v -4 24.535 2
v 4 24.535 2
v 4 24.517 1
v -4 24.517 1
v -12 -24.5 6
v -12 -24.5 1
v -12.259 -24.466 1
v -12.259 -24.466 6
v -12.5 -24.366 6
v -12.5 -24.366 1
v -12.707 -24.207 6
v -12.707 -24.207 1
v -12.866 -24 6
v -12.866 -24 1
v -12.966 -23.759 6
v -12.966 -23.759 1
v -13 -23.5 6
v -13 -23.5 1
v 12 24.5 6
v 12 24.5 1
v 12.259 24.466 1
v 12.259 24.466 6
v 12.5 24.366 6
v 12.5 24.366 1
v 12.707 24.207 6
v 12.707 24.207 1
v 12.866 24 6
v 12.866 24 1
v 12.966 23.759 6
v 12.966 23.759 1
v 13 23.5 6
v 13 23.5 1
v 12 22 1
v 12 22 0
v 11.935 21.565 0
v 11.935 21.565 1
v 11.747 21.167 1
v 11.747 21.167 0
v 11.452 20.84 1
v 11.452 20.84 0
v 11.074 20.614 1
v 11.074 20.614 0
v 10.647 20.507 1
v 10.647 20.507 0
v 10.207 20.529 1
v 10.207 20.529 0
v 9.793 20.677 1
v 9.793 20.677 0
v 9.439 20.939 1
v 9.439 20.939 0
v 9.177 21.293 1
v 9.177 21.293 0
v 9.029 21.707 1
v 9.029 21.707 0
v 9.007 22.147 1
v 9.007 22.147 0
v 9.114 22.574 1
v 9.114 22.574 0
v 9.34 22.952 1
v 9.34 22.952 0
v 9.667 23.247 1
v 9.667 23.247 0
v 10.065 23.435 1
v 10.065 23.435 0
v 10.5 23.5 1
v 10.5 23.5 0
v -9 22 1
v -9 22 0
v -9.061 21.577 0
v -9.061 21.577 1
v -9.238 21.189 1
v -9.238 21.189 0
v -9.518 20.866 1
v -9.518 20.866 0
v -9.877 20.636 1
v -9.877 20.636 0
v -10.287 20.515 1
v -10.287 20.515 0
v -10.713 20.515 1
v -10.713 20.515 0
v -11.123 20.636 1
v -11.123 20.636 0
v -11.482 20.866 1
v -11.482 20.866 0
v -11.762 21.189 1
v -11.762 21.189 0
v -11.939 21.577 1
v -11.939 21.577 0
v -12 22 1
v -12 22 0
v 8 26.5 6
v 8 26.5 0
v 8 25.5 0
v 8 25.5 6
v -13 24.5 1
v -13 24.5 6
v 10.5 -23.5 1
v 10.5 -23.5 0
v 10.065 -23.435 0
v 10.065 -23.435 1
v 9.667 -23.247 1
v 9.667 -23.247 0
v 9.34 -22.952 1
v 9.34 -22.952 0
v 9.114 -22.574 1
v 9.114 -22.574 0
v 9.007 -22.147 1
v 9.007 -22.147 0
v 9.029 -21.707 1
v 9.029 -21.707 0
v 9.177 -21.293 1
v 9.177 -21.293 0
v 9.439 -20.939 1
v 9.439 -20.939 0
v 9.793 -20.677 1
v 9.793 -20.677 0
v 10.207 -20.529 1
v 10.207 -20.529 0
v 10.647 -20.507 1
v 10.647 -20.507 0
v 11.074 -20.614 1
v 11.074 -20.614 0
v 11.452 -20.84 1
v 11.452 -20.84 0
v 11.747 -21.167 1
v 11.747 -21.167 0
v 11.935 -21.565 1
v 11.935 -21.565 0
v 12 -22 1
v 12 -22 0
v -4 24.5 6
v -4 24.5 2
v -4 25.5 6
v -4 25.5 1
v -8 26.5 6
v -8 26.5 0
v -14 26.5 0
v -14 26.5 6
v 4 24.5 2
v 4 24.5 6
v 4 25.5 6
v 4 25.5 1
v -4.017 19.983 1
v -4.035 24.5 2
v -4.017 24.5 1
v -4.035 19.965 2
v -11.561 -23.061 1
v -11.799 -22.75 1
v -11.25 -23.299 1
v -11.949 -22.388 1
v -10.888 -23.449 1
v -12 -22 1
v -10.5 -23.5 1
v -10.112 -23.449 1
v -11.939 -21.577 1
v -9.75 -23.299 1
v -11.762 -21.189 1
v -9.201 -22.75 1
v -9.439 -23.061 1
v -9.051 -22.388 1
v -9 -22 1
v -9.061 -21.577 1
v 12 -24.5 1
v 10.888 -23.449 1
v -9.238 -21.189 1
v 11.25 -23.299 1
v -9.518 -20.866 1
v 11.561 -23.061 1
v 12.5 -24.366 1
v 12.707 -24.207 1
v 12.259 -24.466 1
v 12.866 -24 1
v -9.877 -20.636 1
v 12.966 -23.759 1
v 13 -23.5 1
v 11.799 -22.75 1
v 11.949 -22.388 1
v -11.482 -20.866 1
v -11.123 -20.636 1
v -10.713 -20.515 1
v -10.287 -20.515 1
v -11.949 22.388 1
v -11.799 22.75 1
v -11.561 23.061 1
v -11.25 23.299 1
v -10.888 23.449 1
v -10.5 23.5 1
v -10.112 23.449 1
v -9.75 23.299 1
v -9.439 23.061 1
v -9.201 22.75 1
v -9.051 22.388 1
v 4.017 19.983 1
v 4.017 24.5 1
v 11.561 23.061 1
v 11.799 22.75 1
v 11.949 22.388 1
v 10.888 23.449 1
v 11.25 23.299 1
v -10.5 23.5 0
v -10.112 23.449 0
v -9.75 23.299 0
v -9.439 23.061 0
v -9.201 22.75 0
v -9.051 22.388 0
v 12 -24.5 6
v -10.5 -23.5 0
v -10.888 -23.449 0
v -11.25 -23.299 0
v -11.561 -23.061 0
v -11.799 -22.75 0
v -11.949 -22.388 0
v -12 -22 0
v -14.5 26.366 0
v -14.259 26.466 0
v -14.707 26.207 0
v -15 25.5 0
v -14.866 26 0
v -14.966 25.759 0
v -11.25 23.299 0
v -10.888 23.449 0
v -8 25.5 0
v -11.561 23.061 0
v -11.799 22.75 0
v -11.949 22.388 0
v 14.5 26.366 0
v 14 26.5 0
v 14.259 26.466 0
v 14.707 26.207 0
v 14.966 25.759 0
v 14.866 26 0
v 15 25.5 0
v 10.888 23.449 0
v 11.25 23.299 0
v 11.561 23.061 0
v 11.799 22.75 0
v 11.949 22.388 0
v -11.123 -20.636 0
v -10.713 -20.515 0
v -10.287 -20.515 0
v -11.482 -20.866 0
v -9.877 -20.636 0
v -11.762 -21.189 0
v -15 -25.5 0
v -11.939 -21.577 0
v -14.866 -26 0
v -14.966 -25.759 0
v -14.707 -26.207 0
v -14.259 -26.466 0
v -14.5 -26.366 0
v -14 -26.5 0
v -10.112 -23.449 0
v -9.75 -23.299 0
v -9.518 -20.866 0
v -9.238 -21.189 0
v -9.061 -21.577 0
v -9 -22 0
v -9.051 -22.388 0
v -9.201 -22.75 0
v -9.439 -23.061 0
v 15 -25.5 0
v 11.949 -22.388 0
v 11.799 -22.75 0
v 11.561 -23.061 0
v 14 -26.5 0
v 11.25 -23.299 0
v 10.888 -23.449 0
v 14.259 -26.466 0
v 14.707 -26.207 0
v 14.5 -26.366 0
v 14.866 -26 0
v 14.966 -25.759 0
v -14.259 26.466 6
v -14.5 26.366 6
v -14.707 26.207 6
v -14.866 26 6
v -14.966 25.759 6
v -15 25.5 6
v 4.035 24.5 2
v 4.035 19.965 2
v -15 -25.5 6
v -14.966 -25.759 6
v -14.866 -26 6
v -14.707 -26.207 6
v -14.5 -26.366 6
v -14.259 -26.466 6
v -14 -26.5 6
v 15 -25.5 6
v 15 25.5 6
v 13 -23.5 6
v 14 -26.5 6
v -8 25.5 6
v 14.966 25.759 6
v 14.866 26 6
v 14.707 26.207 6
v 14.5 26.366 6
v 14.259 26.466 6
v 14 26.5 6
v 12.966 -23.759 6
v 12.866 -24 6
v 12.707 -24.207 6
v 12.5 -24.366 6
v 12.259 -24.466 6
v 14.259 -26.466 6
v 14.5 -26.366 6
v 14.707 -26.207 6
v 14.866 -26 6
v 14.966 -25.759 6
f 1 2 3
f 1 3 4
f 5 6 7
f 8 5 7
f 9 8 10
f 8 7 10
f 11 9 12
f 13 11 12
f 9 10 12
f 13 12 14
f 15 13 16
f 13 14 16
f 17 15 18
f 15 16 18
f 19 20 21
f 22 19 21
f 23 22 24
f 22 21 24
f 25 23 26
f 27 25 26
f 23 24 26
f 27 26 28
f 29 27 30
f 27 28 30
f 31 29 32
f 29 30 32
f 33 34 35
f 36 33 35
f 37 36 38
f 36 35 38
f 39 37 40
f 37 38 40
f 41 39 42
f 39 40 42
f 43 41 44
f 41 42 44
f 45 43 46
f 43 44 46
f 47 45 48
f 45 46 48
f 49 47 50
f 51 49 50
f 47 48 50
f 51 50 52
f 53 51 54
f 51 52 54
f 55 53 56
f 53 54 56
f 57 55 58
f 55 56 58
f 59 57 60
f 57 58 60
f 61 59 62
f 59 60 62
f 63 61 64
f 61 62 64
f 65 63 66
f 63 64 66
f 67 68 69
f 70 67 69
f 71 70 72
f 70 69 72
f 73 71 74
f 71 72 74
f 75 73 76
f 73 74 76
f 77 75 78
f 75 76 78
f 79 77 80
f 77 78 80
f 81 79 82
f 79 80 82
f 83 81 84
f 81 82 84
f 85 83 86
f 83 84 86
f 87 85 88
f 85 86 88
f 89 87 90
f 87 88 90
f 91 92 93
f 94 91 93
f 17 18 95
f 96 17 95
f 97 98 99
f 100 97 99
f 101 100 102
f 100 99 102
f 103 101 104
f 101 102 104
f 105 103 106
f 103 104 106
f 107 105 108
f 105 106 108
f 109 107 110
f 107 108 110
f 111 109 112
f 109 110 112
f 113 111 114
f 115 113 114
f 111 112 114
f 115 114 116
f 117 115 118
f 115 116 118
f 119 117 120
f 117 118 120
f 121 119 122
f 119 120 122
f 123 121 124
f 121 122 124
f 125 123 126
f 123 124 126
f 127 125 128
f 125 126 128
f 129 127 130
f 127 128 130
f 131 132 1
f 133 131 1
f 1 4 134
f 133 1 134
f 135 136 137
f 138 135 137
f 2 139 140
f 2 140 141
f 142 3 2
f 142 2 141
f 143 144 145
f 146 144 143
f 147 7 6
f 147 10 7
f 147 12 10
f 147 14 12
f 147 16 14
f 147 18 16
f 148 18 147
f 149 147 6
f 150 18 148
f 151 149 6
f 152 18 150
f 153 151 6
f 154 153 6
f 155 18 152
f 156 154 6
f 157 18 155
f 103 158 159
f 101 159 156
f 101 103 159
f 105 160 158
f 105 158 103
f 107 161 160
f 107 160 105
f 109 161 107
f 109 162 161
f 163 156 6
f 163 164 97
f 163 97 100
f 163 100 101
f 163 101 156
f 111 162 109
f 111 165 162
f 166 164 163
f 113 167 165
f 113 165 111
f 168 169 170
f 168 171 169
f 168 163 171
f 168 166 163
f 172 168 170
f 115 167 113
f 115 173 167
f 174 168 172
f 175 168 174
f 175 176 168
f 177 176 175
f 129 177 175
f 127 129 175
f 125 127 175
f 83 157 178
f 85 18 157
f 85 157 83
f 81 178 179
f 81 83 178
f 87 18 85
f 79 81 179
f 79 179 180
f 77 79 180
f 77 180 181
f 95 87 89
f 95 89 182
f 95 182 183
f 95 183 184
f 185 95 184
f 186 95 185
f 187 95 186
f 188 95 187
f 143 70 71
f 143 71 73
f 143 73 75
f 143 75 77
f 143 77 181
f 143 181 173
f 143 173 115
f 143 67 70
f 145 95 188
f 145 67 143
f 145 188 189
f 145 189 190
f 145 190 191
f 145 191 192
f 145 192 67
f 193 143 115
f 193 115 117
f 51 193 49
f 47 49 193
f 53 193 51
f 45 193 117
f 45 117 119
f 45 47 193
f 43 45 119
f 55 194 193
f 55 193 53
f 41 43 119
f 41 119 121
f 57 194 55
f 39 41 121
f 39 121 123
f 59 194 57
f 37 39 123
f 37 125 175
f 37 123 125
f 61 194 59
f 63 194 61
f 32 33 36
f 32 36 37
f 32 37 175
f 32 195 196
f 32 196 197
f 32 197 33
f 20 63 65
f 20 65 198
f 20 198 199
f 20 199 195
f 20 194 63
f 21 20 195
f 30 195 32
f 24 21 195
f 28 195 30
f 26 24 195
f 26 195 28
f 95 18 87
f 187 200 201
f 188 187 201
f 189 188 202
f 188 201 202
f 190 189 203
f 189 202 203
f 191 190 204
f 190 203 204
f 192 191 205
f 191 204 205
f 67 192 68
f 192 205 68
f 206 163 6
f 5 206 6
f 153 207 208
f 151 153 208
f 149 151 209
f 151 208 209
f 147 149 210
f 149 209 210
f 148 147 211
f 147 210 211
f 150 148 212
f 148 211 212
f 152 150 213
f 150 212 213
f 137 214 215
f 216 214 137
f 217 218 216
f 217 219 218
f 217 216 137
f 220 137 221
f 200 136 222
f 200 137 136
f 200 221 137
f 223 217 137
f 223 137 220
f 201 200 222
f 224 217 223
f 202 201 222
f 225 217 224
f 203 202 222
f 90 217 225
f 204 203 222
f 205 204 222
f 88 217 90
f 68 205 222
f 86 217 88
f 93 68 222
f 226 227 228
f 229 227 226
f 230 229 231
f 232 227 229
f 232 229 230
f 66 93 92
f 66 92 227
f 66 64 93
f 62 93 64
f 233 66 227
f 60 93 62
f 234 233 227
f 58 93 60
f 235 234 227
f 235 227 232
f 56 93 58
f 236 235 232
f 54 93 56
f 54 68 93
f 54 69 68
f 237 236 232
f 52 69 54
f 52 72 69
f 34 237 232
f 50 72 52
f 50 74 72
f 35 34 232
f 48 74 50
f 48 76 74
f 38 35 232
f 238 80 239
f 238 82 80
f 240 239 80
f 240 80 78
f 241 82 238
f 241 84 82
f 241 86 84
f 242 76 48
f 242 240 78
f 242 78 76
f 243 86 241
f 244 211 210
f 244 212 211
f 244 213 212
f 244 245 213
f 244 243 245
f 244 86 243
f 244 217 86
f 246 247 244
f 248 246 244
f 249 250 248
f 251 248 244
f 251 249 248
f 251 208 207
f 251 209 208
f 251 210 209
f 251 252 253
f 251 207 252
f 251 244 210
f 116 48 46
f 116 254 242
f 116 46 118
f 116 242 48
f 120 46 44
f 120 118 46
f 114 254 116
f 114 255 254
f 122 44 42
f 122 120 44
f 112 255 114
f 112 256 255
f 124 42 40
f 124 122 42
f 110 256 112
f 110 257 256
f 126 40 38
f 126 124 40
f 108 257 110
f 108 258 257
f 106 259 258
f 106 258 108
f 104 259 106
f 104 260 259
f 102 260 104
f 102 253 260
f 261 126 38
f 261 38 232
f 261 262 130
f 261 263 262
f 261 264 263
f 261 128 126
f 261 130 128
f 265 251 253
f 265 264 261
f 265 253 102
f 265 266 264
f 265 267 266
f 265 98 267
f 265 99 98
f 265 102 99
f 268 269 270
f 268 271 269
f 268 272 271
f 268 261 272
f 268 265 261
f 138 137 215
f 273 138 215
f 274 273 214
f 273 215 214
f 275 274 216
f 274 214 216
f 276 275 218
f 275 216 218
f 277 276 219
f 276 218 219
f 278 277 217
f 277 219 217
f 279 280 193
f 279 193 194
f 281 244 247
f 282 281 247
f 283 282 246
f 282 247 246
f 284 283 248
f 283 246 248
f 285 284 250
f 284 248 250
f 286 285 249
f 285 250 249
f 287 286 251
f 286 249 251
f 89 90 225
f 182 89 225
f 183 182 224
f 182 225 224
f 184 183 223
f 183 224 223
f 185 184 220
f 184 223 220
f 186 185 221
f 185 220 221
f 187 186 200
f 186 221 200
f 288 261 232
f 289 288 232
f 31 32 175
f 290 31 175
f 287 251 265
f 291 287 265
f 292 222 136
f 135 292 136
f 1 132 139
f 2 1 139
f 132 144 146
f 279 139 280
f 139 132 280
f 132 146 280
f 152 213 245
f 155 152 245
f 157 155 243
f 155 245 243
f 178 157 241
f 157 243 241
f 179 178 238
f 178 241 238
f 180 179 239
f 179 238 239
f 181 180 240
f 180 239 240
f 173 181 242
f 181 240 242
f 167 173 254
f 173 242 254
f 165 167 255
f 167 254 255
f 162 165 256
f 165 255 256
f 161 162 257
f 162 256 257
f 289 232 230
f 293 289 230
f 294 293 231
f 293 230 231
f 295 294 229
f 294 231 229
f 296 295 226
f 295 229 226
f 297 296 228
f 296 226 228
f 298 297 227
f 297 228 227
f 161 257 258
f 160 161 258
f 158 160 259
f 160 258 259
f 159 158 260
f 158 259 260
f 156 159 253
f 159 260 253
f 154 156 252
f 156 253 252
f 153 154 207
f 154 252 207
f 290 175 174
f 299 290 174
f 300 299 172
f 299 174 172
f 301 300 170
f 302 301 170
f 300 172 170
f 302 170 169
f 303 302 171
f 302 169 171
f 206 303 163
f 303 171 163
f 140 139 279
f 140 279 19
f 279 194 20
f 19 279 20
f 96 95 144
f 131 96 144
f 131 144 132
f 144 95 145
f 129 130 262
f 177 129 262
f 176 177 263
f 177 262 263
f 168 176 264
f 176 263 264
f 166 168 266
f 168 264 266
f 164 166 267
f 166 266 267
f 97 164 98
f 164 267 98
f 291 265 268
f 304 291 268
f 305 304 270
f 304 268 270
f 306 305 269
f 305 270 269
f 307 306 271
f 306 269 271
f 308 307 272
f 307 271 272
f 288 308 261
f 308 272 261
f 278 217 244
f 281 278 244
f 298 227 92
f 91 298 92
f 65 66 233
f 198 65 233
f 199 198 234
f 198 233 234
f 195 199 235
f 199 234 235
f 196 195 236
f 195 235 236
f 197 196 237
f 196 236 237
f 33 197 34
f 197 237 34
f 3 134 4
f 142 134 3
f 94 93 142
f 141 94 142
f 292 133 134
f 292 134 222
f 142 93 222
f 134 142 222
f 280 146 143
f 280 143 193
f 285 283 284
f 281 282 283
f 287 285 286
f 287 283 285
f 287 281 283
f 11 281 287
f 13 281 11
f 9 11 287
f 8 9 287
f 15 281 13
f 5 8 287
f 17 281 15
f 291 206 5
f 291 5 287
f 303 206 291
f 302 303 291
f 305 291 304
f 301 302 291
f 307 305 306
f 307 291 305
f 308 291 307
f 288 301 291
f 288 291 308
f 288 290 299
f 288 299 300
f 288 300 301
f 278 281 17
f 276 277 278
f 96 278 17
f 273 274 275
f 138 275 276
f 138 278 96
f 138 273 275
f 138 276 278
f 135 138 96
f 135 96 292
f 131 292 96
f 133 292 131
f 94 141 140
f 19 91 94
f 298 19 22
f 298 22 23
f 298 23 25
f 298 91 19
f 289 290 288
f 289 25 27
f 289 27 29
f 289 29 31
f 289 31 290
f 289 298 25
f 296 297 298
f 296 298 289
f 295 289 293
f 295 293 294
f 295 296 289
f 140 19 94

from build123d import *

# Parameters (mm, degrees)
F0_W     = 4
F0_H     = 1
F1_DEPTH = 1
F2_DEPTH = 6
F3_DEPTH = 2
F3_TAPER = -1


with BuildPart() as f1:
    # F0 (on Top) → F1 (new body)
    with BuildSketch(Plane.XY):
        with BuildLine():
            Line((-13, 24.5), (-12, 24.5))
            Line((-12, 24.5), (-10.5, 24.5))
            Line((-10.5, 24.5), (-8, 24.5))
            Line((-8, 24.5), (-8, 25.5))
            Line((-8, 25.5), (-8, 26.5))
            Line((-8, 26.5), (-14, 26.5))
            ThreePointArc((-14, 26.5), (-14.7071067812, 26.2071067812), (-15, 25.5))
            Line((-15, 25.5), (-15, -25.5))
            ThreePointArc((-15, -25.5), (-14.7071067812, -26.2071067812), (-14, -26.5))
            Line((-14, -26.5), (14, -26.5))
            ThreePointArc((14, -26.5), (14.7071067812, -26.2071067812), (15, -25.5))
            Line((15, -25.5), (15, 25.5))
            ThreePointArc((15, 25.5), (14.7071067812, 26.2071067812), (14, 26.5))
            Line((14, 26.5), (8, 26.5))
            Line((8, 26.5), (8, 25.5))
            Line((8, 25.5), (8, 24.5))
            Line((8, 24.5), (10.5, 24.5))
            Line((10.5, 24.5), (12, 24.5))
            ThreePointArc((12, 24.5), (12.7071067812, 24.2071067812), (13, 23.5))
            Line((13, 23.5), (13, 22))
            Line((13, 22), (13, -22))
            Line((13, -22), (13, -23.5))
            ThreePointArc((13, -23.5), (12.7071067812, -24.2071067812), (12, -24.5))
            Line((12, -24.5), (10.5, -24.5))
            Line((10.5, -24.5), (-10.5, -24.5))
            Line((-10.5, -24.5), (-12, -24.5))
            ThreePointArc((-12, -24.5), (-12.7071067812, -24.2071067812), (-13, -23.5))
            Line((-13, -23.5), (-13, -22))
            Line((-13, -22), (-13, 22))
            Line((-13, 22), (-13, 23.5))
            Line((-13, 23.5), (-13, 24.5))
        make_face()
        with Locations((6, 25)):
            Rectangle(F0_W, F0_H)
        with Locations((2, 25)):
            Rectangle(F0_W, F0_H)
        with Locations((-2, 25)):
            Rectangle(F0_W, F0_H)
        with Locations((-6, 25)):
            Rectangle(F0_W, F0_H)
        Polygon((0, 24.5), (-4, 24.5), (-4, 20), (4, 20), (4, 24.5), align=None)
        with BuildLine():
            Line((-12, -22), (-13, -22))
            Line((-13, -22), (-13, -23.5))
            ThreePointArc((-13, -23.5), (-12.7071067812, -24.2071067812), (-12, -24.5))
            Line((-12, -24.5), (-10.5, -24.5))
            Line((-10.5, -24.5), (-10.5, -23.5))
            ThreePointArc((-10.5, -23.5), (-11.5606601718, -23.0606601718), (-12, -22))
        make_face()
        with BuildLine():
            Line((-8, 24.5), (-10.5, 24.5))
            Line((-10.5, 24.5), (-10.5, 23.5))
            ThreePointArc((-10.5, 23.5), (-9.4393398282, 23.0606601718), (-9, 22))
            ThreePointArc((-9, 22), (-10.5, 20.5), (-12, 22))
            Line((-12, 22), (-13, 22))
            Line((-13, 22), (-13, -22))
            Line((-13, -22), (-12, -22))
            ThreePointArc((-12, -22), (-10.5, -20.5), (-9, -22))
            ThreePointArc((-9, -22), (-9.4393398282, -23.0606601718), (-10.5, -23.5))
            Line((-10.5, -23.5), (-10.5, -24.5))
            Line((-10.5, -24.5), (10.5, -24.5))
            Line((10.5, -24.5), (10.5, -23.5))
            ThreePointArc((10.5, -23.5), (9.4393398282, -20.9393398282), (12, -22))
            Line((12, -22), (13, -22))
            Line((13, -22), (13, 22))
            Line((13, 22), (12, 22))
            ThreePointArc((12, 22), (9.4393398282, 20.9393398282), (10.5, 23.5))
            Line((10.5, 23.5), (10.5, 24.5))
            Line((10.5, 24.5), (8, 24.5))
            Line((8, 24.5), (4, 24.5))
            Line((4, 24.5), (4, 20))
            Line((4, 20), (-4, 20))
            Line((-4, 20), (-4, 24.5))
            Line((-4, 24.5), (-8, 24.5))
        make_face()
        with BuildLine():
            Line((10.5, -23.5), (10.5, -24.5))
            Line((10.5, -24.5), (12, -24.5))
            ThreePointArc((12, -24.5), (12.7071067812, -24.2071067812), (13, -23.5))
            Line((13, -23.5), (13, -22))
            Line((13, -22), (12, -22))
            ThreePointArc((12, -22), (11.5606601718, -23.0606601718), (10.5, -23.5))
        make_face()
        with BuildLine():
            Line((12, 24.5), (10.5, 24.5))
            Line((10.5, 24.5), (10.5, 23.5))
            ThreePointArc((10.5, 23.5), (11.5606601718, 23.0606601718), (12, 22))
            Line((12, 22), (13, 22))
            Line((13, 22), (13, 23.5))
            ThreePointArc((13, 23.5), (12.7071067812, 24.2071067812), (12, 24.5))
        make_face()
        with BuildLine():
            Line((-10.5, 24.5), (-12, 24.5))
            ThreePointArc((-12, 24.5), (-12.7071067812, 24.2071067812), (-13, 23.5))
            Line((-13, 23.5), (-13, 22))
            Line((-13, 22), (-12, 22))
            ThreePointArc((-12, 22), (-11.5606601718, 23.0606601718), (-10.5, 23.5))
            Line((-10.5, 23.5), (-10.5, 24.5))
        make_face()
        with BuildLine():
            ThreePointArc((-13, 23.5), (-12.7071067812, 24.2071067812), (-12, 24.5))
            Line((-12, 24.5), (-13, 24.5))
            Line((-13, 24.5), (-13, 23.5))
        make_face()
    extrude(amount=F1_DEPTH)

    # F0 (on Top) → F2 (join)
    with BuildSketch(Plane.XY):
        with BuildLine():
            Line((-13, 24.5), (-12, 24.5))
            Line((-12, 24.5), (-10.5, 24.5))
            Line((-10.5, 24.5), (-8, 24.5))
            Line((-8, 24.5), (-8, 25.5))
            Line((-8, 25.5), (-8, 26.5))
            Line((-8, 26.5), (-14, 26.5))
            ThreePointArc((-14, 26.5), (-14.7071067812, 26.2071067812), (-15, 25.5))
            Line((-15, 25.5), (-15, -25.5))
            ThreePointArc((-15, -25.5), (-14.7071067812, -26.2071067812), (-14, -26.5))
            Line((-14, -26.5), (14, -26.5))
            ThreePointArc((14, -26.5), (14.7071067812, -26.2071067812), (15, -25.5))
            Line((15, -25.5), (15, 25.5))
            ThreePointArc((15, 25.5), (14.7071067812, 26.2071067812), (14, 26.5))
            Line((14, 26.5), (8, 26.5))
            Line((8, 26.5), (8, 25.5))
            Line((8, 25.5), (8, 24.5))
            Line((8, 24.5), (10.5, 24.5))
            Line((10.5, 24.5), (12, 24.5))
            ThreePointArc((12, 24.5), (12.7071067812, 24.2071067812), (13, 23.5))
            Line((13, 23.5), (13, 22))
            Line((13, 22), (13, -22))
            Line((13, -22), (13, -23.5))
            ThreePointArc((13, -23.5), (12.7071067812, -24.2071067812), (12, -24.5))
            Line((12, -24.5), (10.5, -24.5))
            Line((10.5, -24.5), (-10.5, -24.5))
            Line((-10.5, -24.5), (-12, -24.5))
            ThreePointArc((-12, -24.5), (-12.7071067812, -24.2071067812), (-13, -23.5))
            Line((-13, -23.5), (-13, -22))
            Line((-13, -22), (-13, 22))
            Line((-13, 22), (-13, 23.5))
            Line((-13, 23.5), (-13, 24.5))
        make_face()
        with Locations((6, 25)):
            Rectangle(F0_W, F0_H)
        with Locations((-6, 25)):
            Rectangle(F0_W, F0_H)
    extrude(amount=F2_DEPTH)

    # F0 (on Top) → F3 (join)
    with BuildSketch(Plane.XY):
        Polygon((0, 24.5), (-4, 24.5), (-4, 20), (4, 20), (4, 24.5), align=None)
    extrude(amount=F3_DEPTH, taper=F3_TAPER)


solid = f1.part
